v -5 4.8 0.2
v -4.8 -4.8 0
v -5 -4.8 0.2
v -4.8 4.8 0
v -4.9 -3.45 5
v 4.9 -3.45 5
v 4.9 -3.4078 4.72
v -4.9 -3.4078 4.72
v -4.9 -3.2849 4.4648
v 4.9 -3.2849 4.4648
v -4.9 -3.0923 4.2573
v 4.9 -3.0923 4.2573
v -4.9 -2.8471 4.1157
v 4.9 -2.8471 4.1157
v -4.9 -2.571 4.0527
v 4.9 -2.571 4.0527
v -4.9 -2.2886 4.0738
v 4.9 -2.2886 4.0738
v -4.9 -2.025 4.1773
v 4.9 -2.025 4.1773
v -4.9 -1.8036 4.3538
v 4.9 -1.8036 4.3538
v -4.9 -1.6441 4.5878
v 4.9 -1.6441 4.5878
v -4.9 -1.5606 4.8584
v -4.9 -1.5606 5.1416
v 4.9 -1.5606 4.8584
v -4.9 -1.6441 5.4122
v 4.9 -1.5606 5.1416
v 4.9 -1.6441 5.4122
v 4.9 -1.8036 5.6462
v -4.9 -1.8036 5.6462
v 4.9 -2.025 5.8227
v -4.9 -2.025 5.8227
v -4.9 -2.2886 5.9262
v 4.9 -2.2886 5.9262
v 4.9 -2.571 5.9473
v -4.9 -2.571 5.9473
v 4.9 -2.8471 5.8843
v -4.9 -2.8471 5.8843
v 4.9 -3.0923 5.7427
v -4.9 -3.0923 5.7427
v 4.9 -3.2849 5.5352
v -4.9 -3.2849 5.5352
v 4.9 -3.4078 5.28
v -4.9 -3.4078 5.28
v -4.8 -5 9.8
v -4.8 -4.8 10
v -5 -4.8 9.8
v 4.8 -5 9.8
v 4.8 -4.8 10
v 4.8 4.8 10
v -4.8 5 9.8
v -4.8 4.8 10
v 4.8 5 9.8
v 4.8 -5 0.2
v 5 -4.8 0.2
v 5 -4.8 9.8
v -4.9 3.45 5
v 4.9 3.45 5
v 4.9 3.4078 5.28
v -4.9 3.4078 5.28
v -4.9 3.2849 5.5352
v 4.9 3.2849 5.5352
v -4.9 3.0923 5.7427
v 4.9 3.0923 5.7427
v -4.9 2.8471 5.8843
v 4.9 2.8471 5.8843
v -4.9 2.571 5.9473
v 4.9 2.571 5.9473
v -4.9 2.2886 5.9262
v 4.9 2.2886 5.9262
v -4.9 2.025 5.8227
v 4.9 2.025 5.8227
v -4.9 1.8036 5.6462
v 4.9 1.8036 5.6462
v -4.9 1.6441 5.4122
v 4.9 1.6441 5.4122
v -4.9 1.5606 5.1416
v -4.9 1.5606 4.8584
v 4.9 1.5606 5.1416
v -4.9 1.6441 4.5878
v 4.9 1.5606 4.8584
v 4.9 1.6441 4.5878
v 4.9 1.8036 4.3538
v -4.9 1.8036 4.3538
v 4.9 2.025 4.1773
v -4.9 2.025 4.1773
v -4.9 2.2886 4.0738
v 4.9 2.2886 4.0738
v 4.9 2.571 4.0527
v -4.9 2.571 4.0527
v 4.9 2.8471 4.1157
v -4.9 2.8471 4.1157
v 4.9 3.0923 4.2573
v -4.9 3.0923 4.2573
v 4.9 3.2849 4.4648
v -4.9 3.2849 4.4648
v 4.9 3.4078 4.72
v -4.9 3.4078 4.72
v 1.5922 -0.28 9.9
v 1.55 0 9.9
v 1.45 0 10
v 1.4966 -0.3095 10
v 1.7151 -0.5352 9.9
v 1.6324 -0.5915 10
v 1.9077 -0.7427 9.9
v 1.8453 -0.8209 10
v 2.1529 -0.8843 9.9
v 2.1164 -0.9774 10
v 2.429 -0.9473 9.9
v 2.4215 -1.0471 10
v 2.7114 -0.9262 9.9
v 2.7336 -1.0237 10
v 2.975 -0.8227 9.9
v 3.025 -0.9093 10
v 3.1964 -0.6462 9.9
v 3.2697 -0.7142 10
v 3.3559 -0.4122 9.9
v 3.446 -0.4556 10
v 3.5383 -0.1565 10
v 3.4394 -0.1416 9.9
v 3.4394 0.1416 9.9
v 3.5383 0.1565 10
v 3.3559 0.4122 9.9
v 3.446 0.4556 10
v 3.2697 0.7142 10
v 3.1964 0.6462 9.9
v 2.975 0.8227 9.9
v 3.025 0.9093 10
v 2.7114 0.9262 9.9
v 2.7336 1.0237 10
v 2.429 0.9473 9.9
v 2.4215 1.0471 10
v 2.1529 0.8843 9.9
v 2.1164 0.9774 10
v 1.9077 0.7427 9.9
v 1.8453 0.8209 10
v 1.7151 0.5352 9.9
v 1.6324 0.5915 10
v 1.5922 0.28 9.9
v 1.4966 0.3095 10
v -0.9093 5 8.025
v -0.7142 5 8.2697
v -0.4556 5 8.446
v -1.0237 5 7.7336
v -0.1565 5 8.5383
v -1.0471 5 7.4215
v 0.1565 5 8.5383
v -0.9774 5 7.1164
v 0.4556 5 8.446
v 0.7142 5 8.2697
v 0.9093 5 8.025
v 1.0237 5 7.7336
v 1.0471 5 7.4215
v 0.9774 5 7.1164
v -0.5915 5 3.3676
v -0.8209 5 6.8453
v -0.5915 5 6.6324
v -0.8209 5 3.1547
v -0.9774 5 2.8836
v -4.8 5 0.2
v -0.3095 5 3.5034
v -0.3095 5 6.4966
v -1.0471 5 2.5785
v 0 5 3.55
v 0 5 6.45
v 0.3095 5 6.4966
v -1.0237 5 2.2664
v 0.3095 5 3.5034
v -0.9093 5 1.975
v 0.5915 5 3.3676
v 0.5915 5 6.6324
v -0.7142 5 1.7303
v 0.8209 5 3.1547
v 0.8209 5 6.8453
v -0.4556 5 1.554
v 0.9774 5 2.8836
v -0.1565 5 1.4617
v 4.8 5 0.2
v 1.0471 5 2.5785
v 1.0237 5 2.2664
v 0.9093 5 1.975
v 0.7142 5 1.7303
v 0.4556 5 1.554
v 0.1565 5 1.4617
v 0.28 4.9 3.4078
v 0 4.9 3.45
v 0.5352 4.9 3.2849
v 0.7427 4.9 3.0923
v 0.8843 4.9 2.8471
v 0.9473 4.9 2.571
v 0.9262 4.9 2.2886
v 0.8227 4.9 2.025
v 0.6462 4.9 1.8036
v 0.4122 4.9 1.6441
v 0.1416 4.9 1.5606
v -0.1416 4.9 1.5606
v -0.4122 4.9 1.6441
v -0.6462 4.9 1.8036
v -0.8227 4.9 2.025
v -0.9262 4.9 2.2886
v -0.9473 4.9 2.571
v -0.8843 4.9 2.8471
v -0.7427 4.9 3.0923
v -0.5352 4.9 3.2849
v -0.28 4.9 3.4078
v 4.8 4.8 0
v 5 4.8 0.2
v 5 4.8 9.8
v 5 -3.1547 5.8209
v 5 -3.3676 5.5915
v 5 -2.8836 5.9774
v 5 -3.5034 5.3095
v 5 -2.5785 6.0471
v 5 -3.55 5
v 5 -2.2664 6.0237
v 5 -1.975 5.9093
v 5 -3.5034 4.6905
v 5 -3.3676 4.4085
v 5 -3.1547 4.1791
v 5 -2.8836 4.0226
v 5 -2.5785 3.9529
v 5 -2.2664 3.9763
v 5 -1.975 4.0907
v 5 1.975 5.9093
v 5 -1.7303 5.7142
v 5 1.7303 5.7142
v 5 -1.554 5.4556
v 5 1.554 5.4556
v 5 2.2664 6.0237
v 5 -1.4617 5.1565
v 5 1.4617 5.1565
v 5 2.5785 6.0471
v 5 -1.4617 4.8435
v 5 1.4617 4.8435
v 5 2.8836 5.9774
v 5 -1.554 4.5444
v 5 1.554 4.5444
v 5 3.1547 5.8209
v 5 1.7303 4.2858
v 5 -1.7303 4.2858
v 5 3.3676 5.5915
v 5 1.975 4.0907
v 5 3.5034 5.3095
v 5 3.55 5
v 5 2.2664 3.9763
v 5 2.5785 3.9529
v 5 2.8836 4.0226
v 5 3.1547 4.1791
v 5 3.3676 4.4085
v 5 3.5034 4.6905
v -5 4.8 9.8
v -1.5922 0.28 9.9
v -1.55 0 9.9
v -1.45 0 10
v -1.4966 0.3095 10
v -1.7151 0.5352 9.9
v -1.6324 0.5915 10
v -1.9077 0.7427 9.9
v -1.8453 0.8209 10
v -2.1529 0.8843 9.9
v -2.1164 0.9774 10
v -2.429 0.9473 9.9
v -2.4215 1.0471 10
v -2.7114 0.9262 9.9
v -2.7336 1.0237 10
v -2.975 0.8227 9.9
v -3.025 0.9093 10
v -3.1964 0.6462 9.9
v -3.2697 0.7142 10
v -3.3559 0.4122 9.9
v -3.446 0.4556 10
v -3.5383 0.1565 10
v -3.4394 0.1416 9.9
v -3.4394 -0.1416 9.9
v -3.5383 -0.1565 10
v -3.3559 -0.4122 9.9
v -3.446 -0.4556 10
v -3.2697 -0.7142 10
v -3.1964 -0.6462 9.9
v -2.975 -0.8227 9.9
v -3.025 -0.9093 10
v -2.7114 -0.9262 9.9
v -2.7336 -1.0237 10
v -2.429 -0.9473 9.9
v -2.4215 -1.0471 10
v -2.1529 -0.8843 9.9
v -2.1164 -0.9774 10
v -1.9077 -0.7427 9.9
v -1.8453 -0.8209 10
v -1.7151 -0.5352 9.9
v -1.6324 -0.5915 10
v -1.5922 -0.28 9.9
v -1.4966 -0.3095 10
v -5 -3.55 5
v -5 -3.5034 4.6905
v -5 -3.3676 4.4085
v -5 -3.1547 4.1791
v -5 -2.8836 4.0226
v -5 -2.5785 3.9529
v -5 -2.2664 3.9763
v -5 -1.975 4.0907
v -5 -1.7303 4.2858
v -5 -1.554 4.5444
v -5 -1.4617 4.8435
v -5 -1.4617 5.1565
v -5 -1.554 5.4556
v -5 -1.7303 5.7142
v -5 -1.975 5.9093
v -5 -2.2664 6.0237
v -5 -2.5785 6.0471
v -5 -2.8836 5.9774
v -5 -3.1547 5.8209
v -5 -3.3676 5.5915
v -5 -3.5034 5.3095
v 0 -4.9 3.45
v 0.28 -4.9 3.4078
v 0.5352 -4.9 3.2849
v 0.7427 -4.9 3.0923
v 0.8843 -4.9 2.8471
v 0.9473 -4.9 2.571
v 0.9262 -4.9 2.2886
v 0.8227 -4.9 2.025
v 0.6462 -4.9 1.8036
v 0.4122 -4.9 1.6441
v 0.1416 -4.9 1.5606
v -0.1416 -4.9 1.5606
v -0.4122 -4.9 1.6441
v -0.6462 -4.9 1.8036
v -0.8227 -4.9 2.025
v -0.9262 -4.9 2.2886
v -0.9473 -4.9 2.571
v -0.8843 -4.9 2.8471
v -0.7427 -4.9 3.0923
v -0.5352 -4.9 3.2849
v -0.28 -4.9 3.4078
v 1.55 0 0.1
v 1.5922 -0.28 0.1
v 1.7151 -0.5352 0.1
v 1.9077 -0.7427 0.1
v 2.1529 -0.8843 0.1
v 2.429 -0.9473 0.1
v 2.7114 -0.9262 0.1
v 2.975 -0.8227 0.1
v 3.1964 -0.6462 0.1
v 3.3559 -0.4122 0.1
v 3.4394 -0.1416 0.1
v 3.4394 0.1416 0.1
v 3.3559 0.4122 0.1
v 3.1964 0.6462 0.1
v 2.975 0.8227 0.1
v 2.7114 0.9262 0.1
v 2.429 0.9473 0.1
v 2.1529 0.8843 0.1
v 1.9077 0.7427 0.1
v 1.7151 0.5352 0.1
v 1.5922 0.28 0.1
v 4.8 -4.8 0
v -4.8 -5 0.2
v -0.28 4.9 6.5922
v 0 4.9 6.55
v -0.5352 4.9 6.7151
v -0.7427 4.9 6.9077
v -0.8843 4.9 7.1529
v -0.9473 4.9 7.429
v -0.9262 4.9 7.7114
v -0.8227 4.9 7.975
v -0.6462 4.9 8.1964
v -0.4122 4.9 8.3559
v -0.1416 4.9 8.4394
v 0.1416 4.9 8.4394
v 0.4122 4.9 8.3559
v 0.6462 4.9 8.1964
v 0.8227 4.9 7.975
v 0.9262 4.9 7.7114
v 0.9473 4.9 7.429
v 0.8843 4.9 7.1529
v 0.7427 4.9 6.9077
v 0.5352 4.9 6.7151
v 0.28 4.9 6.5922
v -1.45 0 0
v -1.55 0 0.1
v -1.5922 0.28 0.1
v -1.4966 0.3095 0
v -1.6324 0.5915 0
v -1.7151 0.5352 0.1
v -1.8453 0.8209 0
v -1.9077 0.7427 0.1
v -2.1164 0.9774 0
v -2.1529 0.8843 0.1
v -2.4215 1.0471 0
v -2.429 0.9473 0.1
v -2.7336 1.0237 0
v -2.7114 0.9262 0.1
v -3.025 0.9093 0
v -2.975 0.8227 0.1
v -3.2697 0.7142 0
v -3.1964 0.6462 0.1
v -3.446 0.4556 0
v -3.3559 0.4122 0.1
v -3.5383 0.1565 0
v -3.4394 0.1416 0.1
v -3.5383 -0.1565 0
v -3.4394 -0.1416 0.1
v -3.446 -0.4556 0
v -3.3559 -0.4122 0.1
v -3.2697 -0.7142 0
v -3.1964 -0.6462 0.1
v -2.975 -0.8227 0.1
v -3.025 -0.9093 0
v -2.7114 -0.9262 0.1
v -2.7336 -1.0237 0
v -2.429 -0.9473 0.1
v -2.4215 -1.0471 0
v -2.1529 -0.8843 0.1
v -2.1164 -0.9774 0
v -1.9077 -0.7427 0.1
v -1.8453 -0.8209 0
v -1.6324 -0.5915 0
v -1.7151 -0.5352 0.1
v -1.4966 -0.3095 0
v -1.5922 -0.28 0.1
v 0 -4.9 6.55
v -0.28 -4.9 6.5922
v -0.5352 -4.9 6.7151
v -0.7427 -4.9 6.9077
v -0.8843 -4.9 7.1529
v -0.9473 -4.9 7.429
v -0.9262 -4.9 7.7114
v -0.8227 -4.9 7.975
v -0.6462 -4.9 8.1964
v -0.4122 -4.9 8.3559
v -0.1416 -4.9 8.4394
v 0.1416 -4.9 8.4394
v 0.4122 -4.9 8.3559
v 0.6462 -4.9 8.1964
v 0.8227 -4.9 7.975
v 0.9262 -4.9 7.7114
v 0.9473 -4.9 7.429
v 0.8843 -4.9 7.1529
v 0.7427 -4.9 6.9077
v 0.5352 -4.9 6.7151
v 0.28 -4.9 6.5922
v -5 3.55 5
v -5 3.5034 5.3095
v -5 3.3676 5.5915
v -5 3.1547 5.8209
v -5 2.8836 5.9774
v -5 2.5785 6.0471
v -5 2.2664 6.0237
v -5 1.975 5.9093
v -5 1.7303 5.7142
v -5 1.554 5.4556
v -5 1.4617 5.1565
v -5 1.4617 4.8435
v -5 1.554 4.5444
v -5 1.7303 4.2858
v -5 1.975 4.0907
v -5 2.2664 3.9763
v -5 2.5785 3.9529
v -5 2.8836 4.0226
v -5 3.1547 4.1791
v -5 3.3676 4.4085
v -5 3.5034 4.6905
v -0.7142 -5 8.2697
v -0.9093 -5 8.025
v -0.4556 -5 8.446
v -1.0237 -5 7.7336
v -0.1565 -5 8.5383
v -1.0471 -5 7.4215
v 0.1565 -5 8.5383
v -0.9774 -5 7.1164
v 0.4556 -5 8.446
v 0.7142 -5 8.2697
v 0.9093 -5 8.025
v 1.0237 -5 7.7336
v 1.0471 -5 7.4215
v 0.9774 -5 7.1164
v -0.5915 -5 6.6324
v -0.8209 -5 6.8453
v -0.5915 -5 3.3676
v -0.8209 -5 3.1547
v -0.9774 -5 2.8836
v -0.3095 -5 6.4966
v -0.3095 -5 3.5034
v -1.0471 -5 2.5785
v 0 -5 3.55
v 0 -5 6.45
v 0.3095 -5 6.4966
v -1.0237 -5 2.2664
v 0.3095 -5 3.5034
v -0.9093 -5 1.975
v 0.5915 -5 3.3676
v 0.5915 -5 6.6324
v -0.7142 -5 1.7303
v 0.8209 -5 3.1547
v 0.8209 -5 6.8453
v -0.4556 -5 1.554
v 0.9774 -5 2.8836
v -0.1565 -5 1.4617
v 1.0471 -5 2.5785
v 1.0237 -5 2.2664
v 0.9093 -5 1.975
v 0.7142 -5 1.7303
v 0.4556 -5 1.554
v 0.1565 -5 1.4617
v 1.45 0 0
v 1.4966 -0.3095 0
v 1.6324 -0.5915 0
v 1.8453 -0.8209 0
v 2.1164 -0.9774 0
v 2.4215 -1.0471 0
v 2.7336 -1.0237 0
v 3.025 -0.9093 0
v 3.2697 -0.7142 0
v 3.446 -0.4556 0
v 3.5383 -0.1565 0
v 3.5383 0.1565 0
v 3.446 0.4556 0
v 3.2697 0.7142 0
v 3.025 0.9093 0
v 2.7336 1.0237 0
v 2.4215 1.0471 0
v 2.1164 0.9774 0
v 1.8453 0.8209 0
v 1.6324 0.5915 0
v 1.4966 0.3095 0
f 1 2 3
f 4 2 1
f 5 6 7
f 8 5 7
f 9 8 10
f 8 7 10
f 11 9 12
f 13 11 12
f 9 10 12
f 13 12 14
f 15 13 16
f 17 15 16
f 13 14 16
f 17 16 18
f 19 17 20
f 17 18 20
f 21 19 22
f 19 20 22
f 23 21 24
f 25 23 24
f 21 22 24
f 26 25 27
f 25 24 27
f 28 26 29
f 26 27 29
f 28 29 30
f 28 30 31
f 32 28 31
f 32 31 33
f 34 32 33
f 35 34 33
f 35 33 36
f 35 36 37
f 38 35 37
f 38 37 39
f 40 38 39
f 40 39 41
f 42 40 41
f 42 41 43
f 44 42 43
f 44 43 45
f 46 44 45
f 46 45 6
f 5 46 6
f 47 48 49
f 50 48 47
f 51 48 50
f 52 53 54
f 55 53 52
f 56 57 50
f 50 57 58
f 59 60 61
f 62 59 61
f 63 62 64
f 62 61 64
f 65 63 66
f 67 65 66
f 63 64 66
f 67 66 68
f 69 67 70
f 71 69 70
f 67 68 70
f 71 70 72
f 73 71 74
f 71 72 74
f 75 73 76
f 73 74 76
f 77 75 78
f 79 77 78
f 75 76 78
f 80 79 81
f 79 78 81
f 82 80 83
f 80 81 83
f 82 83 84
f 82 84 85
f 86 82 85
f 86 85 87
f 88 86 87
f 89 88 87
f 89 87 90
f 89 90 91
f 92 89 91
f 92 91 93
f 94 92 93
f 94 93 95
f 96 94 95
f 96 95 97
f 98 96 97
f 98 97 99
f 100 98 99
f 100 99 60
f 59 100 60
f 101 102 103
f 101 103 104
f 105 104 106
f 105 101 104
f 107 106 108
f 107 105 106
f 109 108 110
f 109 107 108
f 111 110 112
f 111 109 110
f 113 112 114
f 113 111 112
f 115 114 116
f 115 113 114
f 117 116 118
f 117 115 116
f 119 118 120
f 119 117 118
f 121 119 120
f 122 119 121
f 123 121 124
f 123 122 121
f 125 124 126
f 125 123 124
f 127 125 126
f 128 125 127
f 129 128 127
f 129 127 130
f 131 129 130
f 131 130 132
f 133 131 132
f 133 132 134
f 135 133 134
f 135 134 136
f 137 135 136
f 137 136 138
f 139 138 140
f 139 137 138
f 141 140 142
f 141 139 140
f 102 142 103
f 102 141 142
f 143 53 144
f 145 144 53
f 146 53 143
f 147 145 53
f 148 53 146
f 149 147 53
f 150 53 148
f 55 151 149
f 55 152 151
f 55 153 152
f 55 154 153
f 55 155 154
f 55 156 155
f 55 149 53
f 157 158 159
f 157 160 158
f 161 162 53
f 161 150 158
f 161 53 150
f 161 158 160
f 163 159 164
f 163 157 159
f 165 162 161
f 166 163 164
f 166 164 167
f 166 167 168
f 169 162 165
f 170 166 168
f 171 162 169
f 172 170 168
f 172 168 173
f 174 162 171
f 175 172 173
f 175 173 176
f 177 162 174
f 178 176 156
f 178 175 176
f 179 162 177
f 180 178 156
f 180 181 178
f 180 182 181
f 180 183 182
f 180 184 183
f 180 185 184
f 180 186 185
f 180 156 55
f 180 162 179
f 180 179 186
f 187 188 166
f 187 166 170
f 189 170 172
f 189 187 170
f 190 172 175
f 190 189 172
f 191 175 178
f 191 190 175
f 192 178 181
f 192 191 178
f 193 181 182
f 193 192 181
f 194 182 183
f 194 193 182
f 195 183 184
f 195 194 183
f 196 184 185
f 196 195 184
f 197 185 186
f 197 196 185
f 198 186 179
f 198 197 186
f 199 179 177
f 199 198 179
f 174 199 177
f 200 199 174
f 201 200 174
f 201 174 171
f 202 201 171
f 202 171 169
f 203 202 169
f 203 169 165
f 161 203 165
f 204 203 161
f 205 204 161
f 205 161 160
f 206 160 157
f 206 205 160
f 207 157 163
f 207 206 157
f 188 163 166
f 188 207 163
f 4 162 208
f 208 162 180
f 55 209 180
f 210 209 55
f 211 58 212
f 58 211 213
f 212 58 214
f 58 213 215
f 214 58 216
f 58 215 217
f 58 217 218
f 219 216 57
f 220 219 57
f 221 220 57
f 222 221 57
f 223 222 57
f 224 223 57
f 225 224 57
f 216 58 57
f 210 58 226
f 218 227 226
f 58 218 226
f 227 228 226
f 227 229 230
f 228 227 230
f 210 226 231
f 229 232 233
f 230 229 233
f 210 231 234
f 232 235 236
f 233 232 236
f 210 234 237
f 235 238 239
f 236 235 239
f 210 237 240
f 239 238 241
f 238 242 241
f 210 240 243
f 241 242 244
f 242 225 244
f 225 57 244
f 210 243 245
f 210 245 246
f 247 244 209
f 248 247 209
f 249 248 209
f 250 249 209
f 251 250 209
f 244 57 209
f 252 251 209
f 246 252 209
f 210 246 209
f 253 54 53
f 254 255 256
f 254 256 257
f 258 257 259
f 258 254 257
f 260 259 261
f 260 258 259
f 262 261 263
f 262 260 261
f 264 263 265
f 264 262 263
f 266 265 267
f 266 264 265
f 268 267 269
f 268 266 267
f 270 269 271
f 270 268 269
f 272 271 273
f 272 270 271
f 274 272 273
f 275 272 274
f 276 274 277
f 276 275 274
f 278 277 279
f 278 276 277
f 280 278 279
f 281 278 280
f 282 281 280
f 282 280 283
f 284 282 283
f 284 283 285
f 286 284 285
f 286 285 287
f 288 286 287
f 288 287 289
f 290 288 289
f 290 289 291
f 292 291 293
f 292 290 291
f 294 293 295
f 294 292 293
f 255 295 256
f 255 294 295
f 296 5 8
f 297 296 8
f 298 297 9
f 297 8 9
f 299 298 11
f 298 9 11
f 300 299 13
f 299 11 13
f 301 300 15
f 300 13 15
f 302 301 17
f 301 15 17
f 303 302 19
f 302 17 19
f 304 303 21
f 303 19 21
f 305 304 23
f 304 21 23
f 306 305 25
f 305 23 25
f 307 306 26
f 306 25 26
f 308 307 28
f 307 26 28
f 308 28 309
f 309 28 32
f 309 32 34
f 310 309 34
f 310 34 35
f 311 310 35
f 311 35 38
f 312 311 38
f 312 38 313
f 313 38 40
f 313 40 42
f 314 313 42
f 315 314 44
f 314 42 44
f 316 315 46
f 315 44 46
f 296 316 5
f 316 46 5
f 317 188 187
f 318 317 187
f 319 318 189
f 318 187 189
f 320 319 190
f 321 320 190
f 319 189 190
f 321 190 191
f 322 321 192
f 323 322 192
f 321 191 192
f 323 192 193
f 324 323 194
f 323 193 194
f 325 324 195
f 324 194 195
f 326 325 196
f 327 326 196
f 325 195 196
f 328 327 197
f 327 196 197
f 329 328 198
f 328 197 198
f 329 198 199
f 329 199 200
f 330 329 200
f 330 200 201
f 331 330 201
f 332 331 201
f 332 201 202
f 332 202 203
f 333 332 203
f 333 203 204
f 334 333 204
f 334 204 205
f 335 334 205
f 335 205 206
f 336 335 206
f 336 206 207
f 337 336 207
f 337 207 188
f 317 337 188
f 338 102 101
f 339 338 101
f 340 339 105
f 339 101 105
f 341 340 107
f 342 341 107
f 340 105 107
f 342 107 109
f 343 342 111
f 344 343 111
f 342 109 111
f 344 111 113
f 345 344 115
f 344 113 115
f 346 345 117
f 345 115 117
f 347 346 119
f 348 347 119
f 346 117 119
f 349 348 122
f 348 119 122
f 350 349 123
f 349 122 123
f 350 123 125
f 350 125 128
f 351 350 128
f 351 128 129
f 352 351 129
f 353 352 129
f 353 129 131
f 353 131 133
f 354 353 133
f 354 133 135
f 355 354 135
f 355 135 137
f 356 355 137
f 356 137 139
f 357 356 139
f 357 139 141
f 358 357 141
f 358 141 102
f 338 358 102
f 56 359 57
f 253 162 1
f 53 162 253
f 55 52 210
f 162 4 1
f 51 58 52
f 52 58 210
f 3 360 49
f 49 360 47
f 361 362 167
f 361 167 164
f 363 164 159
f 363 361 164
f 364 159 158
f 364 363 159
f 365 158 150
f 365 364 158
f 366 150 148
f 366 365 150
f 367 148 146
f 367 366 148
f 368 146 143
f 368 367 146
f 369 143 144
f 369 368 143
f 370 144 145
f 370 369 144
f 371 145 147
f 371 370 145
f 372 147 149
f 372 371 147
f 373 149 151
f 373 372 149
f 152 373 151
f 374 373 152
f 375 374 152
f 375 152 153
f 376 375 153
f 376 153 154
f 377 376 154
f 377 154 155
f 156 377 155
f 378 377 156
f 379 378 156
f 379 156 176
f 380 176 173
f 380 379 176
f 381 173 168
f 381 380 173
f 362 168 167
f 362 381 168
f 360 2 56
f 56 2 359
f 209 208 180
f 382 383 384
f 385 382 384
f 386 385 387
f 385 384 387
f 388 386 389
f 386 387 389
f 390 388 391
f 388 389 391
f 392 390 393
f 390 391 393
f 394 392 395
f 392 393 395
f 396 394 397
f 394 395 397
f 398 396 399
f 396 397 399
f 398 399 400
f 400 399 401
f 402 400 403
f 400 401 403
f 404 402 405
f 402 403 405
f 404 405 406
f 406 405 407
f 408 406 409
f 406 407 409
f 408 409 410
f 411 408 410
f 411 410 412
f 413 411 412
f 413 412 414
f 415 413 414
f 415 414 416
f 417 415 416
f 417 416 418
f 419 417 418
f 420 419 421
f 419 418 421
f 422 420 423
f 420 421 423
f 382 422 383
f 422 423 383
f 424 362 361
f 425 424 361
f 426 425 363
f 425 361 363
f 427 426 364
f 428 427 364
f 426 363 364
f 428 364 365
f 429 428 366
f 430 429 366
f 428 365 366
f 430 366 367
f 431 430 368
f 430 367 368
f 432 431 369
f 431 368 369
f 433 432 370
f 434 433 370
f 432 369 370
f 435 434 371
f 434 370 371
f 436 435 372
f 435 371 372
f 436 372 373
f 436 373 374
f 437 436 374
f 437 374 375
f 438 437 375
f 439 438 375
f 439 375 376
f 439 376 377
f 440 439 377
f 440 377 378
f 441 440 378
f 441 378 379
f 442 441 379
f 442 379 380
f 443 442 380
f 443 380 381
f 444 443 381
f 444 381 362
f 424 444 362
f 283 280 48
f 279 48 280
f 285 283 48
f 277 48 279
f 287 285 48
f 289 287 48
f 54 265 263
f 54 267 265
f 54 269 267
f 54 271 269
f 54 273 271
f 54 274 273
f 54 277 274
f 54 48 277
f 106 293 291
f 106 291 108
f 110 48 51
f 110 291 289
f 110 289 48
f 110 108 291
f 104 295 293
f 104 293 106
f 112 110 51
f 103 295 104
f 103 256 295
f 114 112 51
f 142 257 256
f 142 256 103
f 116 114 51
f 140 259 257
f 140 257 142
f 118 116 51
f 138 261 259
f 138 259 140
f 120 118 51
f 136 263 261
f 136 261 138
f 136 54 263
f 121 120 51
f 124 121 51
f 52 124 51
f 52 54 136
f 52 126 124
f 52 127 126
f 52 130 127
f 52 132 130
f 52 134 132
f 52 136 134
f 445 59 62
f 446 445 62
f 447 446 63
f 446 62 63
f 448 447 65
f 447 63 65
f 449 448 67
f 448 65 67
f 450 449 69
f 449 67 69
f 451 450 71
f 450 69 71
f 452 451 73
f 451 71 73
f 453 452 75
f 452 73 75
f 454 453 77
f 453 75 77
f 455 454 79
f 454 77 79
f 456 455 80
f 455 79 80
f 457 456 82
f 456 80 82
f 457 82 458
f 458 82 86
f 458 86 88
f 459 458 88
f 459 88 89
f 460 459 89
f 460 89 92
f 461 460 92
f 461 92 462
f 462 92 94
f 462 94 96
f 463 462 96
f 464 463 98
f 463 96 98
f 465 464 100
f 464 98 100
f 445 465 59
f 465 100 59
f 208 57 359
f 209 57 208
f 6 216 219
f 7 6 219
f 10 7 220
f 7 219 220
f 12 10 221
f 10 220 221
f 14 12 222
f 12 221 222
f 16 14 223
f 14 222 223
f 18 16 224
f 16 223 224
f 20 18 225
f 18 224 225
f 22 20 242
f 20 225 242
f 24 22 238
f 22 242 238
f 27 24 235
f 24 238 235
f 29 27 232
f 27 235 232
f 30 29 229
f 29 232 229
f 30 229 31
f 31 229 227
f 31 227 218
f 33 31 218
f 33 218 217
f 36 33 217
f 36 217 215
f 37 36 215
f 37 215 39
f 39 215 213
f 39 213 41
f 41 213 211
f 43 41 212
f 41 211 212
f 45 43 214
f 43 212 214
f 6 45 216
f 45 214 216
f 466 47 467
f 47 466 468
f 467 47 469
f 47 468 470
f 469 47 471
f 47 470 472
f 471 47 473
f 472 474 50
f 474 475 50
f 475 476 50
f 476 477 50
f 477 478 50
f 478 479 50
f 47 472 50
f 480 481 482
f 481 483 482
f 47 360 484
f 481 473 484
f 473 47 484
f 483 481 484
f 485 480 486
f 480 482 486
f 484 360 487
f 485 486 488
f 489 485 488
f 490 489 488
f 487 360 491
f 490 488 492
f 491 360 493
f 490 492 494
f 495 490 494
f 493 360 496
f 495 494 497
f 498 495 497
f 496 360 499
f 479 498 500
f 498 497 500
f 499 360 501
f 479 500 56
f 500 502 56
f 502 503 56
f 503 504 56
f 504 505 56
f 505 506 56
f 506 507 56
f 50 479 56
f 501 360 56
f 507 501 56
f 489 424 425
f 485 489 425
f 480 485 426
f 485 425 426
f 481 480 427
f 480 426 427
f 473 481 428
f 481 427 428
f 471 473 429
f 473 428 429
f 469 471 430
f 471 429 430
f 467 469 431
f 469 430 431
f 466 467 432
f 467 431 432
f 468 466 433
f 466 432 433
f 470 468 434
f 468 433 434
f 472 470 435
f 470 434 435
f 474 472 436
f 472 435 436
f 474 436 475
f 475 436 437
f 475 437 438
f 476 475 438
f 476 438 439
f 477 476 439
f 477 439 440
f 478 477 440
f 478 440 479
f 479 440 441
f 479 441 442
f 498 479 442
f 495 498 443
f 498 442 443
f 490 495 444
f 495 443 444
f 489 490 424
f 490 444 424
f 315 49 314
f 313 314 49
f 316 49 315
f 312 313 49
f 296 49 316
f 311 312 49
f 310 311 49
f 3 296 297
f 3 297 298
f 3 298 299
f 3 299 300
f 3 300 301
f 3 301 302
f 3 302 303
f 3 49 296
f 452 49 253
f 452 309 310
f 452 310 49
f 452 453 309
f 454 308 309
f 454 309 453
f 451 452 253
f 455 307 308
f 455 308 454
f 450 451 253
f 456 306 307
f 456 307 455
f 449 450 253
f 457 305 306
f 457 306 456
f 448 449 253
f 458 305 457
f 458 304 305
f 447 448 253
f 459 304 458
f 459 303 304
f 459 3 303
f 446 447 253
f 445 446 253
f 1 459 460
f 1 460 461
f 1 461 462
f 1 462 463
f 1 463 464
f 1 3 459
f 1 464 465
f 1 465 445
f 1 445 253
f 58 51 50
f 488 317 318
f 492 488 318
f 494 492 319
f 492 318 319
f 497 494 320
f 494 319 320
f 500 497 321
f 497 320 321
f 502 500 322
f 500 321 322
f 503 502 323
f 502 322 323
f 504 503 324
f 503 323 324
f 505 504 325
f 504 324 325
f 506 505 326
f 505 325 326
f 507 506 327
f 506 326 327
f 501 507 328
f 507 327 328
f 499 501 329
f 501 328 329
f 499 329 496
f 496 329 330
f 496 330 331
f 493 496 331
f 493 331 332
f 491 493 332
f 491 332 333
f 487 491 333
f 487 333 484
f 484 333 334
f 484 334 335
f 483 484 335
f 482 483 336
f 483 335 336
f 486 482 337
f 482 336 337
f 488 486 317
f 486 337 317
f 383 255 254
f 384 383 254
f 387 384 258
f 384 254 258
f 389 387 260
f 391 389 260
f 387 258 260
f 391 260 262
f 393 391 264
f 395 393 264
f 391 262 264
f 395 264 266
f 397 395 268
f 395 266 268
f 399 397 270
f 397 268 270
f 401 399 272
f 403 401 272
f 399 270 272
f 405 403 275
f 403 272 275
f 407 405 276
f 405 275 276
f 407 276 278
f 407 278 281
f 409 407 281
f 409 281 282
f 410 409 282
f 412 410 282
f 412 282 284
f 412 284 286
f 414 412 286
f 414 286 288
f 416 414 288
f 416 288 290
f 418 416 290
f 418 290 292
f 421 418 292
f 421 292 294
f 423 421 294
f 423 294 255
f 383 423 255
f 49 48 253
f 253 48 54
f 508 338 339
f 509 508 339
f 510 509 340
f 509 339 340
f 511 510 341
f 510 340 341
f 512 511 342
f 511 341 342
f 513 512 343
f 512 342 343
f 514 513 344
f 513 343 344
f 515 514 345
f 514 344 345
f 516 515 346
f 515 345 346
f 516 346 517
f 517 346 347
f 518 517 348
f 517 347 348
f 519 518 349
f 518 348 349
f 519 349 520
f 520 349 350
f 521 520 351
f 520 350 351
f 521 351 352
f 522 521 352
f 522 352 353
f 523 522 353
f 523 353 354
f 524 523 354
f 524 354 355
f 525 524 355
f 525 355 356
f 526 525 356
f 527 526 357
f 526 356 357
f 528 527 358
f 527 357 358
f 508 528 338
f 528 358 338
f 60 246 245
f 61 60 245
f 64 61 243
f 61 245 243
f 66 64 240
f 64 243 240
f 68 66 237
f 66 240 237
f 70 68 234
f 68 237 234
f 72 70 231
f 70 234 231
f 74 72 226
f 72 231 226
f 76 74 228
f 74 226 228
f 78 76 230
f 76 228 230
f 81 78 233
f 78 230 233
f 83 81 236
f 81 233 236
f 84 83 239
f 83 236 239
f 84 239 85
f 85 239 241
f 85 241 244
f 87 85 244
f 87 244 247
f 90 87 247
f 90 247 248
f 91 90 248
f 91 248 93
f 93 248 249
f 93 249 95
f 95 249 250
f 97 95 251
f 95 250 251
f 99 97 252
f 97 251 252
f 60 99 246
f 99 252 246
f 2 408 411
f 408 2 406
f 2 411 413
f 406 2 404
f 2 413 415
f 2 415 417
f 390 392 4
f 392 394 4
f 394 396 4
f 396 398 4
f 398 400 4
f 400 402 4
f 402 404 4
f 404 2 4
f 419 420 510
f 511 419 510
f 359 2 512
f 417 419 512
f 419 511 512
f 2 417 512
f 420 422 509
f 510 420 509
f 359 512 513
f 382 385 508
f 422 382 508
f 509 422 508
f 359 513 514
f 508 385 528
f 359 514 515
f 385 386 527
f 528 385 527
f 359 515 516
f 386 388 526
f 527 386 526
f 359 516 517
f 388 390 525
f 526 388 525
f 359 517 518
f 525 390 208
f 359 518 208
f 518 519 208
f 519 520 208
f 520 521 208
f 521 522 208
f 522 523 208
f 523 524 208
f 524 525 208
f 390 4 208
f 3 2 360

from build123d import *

# Parameters (mm, degrees)
SKETCH1_W           = 10
SKETCH1_H           = 10
BOSS_EXTRUDE1_DEPTH = 10
SKETCH2_R           = 0.95
CUT_EXTRUDE1_DEPTH  = 11
SKETCH3_R           = 0.95
CUT_EXTRUDE2_DEPTH  = 11
SKETCH5_R           = 0.95
CUT_EXTRUDE4_DEPTH  = 11
CHAMFER1_SIZE       = 0.2
CHAMFER2_SIZE       = 0.1


with BuildPart() as part:
    # Sketch1 → Boss-Extrude1 (new body)
    with BuildSketch(Plane.XY):
        Rectangle(SKETCH1_W, SKETCH1_H)
    extrude(amount=BOSS_EXTRUDE1_DEPTH)

    # Sketch2 → Cut-Extrude1 (cut, through all)
    with BuildSketch(Plane.XY.offset(10)):
        with Locations((-2.5, 0)):
            Circle(SKETCH2_R)
        with Locations(Location((2.5, 0, 0), (0, 0, 180))):  # turned: the seam where the file's is
            Circle(SKETCH2_R)
    extrude(amount=-CUT_EXTRUDE1_DEPTH, mode=Mode.SUBTRACT)

    # Sketch3 → Cut-Extrude2 (cut, through all)
    with BuildSketch(Plane(origin=(0, 5, 0), x_dir=(1, 0, 0), z_dir=(0, 1, 0))):
        with Locations(Location((0, -7.5, 0), (0, 0, 90))):  # turned: the seam where the file's is
            Circle(SKETCH3_R)
        with Locations(Location((0, -2.5, 0), (0, 0, 270))):  # turned: the seam where the file's is
            Circle(SKETCH3_R)
    extrude(amount=-CUT_EXTRUDE2_DEPTH, mode=Mode.SUBTRACT)

    # Sketch5 → Cut-Extrude4 (cut, through all)
    with BuildSketch(Plane(origin=(5, 0, 0), x_dir=(0, 0, -1), z_dir=(1, 0, 0))):
        with Locations(Location((-5, 2.5, 0), (0, 0, 90))):  # turned: the seam where the file's is
            Circle(SKETCH5_R)
        with Locations(Location((-5, -2.5, 0), (0, 0, 270))):  # turned: the seam where the file's is
            Circle(SKETCH5_R)
    extrude(amount=-CUT_EXTRUDE4_DEPTH, mode=Mode.SUBTRACT)

    # Chamfer1
    chamfer1_edges = [part.edges().sort_by_distance(p)[0] for p in [
        (5, 0, 10),
        (0, 5, 10),
        (-5, 0, 10),
        (0, 5, 0),
        (5, 0, 0),
        (0, -5, 0),
        (-5, 0, 0),
        (0, -5, 10),
        (-5, 5, 5),
        (5, 5, 5),
        (5, -5, 5),
        (-5, -5, 5),
    ]]
    chamfer(chamfer1_edges, length=CHAMFER1_SIZE)

    # Chamfer2
    chamfer2_edges = [part.edges().sort_by_distance(p)[0] for p in [
        (-3.45, 0, 0),
        (-3.45, 0, 10),
        (3.45, 0, 0),
        (3.45, 0, 10),
        (0, -5, 8.45),
        (0, 5, 8.45),
        (0, -5, 1.55),
        (0, 5, 1.55),
        (-5, 1.55, 5),
        (5, 1.55, 5),
        (-5, -1.55, 5),
        (5, -1.55, 5),
    ]]
    chamfer(chamfer2_edges, length=CHAMFER2_SIZE)


solid = part.part
